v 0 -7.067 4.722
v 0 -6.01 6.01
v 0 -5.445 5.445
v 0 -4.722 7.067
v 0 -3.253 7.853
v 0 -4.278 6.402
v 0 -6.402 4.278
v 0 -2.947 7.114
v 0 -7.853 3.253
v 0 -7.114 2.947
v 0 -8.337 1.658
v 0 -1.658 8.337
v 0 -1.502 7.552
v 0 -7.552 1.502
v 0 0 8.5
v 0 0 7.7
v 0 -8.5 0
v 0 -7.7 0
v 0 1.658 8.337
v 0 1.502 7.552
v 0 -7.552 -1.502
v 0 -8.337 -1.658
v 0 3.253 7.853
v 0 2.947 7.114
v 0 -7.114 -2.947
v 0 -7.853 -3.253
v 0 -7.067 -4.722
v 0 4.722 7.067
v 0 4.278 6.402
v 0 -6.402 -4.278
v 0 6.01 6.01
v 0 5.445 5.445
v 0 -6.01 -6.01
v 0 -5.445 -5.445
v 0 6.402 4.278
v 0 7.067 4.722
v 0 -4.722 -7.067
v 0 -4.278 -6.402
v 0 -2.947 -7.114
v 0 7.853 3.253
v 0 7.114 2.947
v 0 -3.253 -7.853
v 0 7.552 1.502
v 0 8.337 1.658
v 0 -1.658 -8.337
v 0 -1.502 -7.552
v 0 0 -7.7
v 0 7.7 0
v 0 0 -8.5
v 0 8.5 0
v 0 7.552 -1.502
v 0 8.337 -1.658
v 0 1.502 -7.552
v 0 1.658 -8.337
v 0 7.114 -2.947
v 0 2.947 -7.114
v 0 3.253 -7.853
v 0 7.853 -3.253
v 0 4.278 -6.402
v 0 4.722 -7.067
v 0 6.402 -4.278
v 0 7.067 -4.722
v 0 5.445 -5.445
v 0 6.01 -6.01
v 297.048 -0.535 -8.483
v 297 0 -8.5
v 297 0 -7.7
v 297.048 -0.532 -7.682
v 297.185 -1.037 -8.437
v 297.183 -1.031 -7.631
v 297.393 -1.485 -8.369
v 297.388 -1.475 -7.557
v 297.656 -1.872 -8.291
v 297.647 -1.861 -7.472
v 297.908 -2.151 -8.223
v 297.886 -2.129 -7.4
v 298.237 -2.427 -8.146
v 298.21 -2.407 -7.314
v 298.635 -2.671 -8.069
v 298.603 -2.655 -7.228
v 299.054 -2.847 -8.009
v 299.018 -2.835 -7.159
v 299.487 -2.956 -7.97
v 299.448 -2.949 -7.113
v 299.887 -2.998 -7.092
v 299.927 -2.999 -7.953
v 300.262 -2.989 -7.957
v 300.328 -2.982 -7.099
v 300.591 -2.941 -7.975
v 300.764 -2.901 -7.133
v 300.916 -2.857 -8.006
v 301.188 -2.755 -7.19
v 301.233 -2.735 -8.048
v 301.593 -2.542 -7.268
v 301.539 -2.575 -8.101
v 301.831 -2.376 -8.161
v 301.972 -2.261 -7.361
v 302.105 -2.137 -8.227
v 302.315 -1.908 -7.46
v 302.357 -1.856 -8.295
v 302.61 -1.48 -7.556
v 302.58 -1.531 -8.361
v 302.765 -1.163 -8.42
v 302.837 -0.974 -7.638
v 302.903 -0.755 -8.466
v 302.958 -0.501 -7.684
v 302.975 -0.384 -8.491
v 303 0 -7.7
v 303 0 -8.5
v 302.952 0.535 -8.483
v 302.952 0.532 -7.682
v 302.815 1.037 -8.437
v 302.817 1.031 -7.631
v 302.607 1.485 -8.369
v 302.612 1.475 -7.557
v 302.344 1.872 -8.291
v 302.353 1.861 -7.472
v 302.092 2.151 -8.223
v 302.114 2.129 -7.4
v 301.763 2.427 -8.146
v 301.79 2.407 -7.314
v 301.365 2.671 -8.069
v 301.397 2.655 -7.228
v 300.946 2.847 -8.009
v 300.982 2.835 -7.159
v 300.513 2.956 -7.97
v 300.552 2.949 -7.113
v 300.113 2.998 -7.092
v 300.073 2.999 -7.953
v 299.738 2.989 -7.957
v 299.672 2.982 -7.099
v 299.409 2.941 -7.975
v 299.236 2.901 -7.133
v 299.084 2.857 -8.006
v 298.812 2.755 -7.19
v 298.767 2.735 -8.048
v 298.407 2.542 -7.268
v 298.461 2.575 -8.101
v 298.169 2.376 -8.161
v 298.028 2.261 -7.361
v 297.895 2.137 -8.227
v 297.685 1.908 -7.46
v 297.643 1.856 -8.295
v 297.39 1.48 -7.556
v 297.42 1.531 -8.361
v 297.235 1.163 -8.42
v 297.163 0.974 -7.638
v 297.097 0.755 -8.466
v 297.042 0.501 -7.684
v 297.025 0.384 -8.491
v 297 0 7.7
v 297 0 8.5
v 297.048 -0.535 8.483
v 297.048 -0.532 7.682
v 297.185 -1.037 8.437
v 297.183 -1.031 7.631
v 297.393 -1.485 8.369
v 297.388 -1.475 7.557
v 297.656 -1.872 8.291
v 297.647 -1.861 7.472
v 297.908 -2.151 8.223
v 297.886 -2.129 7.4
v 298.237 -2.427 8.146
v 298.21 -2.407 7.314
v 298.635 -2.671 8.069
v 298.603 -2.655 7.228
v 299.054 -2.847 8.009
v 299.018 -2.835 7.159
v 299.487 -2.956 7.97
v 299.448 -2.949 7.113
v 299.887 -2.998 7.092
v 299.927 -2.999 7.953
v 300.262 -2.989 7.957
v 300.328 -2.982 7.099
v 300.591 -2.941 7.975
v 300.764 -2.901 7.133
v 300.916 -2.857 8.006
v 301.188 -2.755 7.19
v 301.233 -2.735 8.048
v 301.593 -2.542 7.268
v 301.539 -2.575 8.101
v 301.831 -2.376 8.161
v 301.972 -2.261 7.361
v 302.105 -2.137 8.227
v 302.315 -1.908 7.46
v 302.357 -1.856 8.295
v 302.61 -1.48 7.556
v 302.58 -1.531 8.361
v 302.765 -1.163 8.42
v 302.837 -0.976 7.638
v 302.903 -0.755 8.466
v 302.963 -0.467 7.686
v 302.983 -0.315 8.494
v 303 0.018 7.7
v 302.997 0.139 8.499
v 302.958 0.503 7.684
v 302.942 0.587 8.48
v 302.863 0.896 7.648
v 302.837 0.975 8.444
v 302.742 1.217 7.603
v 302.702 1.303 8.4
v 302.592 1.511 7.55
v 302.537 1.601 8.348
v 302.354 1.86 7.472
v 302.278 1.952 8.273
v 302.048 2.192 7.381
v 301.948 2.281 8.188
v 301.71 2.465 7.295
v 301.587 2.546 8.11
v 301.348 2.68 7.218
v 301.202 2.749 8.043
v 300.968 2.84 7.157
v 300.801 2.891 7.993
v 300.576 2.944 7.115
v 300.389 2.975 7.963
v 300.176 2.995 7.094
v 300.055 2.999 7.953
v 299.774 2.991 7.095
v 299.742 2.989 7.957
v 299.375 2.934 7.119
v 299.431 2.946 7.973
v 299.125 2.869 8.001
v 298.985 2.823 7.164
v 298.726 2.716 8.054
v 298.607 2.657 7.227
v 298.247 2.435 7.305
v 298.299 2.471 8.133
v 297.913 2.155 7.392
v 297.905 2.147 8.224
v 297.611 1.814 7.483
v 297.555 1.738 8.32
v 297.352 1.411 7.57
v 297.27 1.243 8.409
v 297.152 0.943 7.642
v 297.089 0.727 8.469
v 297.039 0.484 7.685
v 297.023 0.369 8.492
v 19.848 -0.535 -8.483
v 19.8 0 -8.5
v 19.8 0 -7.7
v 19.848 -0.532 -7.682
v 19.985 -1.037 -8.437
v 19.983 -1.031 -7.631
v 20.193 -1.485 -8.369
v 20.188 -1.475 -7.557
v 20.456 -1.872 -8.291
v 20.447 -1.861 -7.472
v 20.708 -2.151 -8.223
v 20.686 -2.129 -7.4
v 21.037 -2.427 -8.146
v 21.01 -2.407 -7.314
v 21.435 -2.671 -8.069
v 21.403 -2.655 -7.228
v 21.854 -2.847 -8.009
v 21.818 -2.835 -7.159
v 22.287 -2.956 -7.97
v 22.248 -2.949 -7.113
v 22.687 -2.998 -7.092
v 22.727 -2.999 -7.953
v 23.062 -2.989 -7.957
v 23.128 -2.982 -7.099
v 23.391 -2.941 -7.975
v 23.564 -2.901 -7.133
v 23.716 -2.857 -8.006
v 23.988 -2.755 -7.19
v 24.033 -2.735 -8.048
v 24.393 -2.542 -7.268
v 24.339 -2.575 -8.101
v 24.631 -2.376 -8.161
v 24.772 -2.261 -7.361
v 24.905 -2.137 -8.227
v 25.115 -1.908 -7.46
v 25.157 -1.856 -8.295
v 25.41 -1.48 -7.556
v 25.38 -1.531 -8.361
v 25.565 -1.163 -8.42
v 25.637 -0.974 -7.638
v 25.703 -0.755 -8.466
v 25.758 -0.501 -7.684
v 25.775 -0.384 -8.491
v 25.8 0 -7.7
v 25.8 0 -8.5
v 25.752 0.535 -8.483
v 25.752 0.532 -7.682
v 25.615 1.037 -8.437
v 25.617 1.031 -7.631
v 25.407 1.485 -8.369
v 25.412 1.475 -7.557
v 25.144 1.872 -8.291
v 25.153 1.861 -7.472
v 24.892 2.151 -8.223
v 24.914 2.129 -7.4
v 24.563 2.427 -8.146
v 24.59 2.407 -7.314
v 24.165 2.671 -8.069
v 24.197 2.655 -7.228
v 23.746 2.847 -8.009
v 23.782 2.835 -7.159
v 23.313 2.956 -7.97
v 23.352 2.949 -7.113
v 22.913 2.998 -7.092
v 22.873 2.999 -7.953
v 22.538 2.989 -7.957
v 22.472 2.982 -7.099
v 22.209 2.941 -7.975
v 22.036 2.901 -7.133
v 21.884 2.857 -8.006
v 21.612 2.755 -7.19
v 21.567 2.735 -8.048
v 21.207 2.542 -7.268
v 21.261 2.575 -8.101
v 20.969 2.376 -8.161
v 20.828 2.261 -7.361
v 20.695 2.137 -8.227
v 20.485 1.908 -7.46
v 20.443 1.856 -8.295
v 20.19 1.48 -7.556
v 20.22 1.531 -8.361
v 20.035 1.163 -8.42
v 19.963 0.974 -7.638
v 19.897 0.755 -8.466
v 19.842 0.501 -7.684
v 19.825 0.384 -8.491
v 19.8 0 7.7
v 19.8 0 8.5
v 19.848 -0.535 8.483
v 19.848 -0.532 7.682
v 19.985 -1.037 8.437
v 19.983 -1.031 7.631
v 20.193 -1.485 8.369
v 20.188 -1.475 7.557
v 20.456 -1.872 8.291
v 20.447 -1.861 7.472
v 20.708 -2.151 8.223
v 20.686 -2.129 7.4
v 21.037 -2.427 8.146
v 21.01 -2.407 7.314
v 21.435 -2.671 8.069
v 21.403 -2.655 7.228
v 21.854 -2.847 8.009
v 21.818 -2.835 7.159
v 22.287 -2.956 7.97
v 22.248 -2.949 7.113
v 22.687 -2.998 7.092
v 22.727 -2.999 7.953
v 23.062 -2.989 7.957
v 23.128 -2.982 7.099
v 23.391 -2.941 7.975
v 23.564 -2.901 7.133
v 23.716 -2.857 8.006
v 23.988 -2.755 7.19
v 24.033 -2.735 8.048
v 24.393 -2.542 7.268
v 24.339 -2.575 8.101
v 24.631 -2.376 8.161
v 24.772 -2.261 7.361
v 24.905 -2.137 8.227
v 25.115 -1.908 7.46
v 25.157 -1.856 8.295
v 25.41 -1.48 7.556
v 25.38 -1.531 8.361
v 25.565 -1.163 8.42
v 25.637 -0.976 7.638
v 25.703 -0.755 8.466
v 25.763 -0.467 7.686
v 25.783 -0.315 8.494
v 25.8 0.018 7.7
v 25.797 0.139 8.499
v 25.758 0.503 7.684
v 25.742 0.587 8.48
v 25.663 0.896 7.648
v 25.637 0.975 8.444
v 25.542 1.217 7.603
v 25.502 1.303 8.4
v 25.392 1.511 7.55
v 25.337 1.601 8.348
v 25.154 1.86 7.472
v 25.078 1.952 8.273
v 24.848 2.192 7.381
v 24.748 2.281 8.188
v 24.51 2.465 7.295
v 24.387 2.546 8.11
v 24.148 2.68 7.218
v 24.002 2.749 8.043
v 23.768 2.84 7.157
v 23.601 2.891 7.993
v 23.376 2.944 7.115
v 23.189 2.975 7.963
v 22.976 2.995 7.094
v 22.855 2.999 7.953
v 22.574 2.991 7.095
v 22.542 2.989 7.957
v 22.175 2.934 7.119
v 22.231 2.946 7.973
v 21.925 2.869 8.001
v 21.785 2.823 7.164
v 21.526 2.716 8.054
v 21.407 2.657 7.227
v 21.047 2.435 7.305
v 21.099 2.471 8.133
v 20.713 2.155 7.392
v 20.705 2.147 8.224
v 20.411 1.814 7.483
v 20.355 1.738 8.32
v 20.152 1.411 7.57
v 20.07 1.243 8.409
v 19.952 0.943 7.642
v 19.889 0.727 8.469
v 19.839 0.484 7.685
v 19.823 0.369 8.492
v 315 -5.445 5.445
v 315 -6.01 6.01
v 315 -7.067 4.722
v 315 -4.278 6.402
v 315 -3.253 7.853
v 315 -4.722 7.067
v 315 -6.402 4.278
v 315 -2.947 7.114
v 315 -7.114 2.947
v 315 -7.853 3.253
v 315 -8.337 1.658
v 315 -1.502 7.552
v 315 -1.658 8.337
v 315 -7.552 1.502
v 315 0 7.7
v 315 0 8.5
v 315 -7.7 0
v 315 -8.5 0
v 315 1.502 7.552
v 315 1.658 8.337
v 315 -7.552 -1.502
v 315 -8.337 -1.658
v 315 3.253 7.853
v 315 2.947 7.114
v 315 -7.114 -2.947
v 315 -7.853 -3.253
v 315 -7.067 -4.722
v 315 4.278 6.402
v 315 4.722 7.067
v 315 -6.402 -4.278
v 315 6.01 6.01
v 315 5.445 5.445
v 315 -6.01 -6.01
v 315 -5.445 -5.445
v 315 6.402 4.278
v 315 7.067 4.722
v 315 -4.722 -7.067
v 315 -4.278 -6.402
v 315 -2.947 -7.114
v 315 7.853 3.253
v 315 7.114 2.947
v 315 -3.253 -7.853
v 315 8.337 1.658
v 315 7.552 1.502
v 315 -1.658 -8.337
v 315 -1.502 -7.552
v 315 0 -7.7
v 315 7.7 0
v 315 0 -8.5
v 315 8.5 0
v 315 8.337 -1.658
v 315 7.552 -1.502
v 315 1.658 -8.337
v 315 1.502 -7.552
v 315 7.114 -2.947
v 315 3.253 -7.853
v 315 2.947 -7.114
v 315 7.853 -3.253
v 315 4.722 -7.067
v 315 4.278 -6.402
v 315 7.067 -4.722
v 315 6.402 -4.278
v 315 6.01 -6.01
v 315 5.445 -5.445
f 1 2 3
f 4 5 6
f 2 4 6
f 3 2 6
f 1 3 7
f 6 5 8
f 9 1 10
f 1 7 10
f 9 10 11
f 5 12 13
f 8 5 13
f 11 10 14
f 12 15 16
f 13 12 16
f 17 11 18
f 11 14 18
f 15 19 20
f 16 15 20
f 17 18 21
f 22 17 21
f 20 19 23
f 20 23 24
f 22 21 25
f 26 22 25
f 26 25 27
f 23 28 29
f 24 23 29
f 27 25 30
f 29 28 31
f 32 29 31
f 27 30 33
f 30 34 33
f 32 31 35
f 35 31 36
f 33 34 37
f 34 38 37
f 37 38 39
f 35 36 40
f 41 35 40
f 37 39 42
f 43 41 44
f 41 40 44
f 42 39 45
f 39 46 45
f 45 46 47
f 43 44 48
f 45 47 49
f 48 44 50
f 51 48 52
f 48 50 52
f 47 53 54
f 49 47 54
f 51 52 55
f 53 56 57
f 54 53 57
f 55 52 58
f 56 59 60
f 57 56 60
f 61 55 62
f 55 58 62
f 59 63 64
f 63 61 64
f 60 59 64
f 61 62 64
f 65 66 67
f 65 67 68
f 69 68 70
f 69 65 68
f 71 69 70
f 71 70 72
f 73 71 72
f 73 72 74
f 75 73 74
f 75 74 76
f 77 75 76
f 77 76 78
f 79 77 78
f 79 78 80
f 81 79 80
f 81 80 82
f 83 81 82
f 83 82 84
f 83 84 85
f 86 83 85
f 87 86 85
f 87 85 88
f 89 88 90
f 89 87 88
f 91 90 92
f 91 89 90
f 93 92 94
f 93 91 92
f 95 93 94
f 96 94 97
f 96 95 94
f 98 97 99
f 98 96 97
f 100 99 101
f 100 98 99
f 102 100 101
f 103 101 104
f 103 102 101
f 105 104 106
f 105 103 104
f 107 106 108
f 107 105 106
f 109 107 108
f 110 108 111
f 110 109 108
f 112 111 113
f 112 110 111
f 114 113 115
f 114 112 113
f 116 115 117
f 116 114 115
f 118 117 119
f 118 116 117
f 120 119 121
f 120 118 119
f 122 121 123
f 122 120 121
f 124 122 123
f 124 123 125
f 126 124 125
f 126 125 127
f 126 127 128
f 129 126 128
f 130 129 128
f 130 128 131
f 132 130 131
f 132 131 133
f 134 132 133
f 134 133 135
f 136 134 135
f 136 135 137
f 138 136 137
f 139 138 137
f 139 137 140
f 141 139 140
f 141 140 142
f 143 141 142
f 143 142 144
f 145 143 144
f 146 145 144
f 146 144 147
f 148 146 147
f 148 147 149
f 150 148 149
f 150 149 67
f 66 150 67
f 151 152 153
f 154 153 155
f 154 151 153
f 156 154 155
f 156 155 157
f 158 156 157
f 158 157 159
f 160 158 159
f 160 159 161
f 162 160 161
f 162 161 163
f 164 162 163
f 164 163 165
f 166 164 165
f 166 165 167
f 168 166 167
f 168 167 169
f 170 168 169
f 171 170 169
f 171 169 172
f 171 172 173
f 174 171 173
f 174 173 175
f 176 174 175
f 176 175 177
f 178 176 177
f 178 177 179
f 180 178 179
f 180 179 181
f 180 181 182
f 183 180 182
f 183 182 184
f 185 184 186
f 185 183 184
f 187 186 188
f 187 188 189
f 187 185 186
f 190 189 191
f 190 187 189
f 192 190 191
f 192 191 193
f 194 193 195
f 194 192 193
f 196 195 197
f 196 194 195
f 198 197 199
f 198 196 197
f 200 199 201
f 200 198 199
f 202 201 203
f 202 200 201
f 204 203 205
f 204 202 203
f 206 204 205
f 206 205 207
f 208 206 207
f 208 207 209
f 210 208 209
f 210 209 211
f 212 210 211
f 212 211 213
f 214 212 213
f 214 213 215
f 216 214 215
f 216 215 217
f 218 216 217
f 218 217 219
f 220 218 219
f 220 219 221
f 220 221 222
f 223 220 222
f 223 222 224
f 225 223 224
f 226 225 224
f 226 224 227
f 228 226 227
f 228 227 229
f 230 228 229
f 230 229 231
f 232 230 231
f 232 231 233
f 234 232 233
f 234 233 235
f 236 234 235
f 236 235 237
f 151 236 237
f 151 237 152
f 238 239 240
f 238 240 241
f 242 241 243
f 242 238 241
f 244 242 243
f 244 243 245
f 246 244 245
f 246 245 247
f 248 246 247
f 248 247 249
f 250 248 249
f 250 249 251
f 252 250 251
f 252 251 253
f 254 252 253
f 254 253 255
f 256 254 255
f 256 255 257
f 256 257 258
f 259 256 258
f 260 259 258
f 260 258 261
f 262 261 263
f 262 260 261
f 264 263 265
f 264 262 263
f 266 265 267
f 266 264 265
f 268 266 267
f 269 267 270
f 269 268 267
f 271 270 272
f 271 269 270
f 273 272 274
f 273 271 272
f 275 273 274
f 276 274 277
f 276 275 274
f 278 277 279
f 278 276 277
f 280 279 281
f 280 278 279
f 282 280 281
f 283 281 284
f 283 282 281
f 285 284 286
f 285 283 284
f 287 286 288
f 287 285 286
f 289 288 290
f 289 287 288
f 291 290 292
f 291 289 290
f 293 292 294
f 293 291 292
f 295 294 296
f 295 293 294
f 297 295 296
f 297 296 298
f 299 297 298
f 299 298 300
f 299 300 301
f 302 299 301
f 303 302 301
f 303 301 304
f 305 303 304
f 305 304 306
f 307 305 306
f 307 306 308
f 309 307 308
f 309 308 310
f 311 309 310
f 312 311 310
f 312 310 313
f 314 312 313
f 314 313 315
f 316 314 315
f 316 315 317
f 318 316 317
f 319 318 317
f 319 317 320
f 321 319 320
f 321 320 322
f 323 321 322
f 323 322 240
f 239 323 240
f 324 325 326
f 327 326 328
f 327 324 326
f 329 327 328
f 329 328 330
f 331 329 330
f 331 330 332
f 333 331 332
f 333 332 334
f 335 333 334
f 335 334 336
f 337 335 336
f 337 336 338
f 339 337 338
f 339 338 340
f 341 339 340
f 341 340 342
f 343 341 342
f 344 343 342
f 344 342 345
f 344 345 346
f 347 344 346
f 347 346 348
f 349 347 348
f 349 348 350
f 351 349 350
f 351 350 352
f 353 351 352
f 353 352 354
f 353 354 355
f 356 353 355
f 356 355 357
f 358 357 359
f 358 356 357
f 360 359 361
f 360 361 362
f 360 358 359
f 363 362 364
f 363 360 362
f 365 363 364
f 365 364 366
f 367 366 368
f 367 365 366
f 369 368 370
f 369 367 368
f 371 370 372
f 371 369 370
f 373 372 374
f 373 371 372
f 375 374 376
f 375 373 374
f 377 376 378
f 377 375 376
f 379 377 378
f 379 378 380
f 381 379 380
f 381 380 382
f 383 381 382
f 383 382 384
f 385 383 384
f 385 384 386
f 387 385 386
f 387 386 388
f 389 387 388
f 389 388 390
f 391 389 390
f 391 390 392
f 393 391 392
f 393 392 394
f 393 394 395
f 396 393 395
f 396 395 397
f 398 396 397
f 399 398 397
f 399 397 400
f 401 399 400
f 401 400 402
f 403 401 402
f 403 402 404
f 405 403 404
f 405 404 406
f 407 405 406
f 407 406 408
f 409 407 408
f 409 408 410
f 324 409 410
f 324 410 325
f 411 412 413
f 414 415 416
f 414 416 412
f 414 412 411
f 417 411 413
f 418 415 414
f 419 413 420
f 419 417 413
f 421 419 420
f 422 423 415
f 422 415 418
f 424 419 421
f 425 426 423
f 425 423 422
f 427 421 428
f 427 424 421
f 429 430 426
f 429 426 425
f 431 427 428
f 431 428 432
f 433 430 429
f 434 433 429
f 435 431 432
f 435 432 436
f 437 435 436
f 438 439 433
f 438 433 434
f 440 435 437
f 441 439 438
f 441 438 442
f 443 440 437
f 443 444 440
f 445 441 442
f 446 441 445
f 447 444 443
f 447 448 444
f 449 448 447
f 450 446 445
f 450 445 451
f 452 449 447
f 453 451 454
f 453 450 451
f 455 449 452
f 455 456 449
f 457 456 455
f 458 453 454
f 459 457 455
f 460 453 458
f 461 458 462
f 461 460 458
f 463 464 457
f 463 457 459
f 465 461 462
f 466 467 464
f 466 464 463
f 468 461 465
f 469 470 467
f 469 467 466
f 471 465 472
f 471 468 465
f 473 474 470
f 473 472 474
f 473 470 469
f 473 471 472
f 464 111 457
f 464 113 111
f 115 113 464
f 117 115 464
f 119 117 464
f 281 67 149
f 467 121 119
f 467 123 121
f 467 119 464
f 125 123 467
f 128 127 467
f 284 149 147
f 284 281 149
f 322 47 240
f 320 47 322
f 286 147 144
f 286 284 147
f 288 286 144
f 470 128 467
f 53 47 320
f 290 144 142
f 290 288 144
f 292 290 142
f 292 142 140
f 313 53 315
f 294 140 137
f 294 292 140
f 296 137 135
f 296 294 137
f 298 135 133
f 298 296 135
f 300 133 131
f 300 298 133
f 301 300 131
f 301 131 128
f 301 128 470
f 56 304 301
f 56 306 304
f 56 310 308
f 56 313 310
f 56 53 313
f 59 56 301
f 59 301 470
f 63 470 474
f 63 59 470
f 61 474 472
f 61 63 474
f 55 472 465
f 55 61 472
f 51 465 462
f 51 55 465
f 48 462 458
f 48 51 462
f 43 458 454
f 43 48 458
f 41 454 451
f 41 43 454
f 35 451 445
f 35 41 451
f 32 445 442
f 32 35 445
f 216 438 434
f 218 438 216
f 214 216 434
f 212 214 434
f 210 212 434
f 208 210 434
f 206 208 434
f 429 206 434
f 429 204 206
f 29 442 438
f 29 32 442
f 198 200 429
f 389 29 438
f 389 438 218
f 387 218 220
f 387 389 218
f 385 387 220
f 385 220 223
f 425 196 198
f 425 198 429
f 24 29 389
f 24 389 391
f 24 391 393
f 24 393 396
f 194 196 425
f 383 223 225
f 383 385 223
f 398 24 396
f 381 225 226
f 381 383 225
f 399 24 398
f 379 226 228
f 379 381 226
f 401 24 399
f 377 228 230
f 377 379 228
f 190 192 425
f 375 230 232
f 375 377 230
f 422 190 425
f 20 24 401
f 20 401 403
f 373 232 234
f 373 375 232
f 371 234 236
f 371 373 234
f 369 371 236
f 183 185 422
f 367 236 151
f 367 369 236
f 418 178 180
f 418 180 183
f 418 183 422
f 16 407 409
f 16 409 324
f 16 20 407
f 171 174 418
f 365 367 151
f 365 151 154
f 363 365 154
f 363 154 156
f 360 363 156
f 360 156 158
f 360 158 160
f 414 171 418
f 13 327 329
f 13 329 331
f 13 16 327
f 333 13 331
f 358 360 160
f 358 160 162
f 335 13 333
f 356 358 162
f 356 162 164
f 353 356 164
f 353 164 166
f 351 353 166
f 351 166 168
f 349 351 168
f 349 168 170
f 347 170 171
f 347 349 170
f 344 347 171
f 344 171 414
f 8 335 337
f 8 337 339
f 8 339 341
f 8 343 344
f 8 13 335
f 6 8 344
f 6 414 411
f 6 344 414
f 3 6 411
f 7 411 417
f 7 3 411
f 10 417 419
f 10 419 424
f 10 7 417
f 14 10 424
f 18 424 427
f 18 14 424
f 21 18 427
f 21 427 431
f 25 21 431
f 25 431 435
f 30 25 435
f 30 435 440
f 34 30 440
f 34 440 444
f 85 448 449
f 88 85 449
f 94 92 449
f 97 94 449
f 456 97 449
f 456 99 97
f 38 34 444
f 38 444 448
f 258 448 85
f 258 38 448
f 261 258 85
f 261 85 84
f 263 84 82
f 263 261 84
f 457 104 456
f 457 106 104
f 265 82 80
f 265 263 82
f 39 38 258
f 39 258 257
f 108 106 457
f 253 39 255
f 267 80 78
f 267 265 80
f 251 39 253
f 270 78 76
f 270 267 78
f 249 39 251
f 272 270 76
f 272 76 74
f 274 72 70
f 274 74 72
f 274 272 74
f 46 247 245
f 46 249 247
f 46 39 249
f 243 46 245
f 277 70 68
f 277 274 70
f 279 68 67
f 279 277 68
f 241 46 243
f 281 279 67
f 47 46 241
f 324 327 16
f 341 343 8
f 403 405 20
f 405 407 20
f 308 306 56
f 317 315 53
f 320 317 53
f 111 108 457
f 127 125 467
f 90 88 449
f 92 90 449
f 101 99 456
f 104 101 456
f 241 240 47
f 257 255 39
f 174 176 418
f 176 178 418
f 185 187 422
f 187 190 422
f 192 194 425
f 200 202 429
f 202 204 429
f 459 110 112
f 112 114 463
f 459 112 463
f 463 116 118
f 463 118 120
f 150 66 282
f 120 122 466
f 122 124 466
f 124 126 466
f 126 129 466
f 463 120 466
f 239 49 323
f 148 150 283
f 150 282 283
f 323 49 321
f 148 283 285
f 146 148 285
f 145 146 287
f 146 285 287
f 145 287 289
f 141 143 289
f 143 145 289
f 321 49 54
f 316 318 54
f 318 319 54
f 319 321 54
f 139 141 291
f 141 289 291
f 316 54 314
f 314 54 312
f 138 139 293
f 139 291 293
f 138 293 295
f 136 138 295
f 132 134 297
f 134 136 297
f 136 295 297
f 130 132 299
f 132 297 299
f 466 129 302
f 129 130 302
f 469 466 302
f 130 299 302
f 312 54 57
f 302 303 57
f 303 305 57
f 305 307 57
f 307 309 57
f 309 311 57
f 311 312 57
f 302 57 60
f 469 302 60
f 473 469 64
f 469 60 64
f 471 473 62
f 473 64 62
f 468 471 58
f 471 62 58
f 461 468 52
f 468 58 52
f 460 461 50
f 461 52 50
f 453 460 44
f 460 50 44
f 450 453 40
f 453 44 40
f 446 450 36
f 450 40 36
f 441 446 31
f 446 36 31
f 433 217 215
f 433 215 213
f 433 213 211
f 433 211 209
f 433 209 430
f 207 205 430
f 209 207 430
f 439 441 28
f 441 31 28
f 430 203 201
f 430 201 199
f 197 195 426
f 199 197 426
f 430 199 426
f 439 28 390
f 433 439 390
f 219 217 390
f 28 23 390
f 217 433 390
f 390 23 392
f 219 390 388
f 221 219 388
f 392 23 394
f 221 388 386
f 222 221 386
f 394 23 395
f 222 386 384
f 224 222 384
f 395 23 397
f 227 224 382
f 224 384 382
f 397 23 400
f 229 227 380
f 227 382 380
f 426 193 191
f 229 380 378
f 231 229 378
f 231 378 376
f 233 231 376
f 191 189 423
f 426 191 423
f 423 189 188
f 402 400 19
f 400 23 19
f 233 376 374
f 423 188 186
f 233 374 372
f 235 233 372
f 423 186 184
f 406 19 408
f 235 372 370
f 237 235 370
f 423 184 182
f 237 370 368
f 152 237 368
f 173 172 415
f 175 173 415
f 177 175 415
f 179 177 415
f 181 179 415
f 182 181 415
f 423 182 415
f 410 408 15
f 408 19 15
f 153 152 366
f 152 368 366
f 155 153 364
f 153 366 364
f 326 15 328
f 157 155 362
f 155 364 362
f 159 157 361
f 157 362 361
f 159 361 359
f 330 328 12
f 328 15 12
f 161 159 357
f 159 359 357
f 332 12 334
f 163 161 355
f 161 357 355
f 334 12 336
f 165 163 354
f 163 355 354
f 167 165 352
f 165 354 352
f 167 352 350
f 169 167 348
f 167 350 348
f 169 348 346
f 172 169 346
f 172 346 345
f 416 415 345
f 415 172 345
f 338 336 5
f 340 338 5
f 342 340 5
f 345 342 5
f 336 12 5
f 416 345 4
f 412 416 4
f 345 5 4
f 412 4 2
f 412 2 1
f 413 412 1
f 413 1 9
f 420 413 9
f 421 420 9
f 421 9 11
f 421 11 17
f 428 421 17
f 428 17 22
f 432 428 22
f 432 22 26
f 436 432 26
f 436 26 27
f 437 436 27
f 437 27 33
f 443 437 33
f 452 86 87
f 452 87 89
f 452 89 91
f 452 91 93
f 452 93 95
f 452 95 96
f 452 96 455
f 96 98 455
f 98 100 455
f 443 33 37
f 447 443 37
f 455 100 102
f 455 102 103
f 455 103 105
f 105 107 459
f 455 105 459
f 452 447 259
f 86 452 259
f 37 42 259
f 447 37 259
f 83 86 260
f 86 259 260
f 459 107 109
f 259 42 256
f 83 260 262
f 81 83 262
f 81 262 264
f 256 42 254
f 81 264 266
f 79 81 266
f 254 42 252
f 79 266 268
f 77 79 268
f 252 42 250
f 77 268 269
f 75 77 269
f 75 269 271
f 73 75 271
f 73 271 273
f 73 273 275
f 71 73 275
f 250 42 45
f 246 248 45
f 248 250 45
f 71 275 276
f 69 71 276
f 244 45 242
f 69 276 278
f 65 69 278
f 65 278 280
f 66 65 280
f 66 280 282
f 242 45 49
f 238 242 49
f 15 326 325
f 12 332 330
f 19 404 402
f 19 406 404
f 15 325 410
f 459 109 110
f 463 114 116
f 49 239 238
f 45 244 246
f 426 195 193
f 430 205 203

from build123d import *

# Parameters (mm, degrees)
SKETCH1_R               = 8.5
SKETCH1_R_2             = 7.7
BOSS_EXTRUDE1_DEPTH     = 315
CUT_EXTRUDE1_DEPTH      = 320
CUT_EXTRUDE1_DEPTH_BACK = 320
SKETCH2_R               = 3


with BuildPart() as part:
    # Sketch1 → Boss-Extrude1 (new body)
    with BuildSketch(Plane(origin=(0, 0, 0), x_dir=(0, 0, -1), z_dir=(1, 0, 0))):
        Circle(SKETCH1_R)
        Circle(SKETCH1_R_2, mode=Mode.SUBTRACT)
    extrude(amount=BOSS_EXTRUDE1_DEPTH)

    # Sketch2 → Cut-Extrude1 (cut, two sides: drawn at the far end of the back side and taken through both)
    with BuildSketch(Plane.XY.offset(-CUT_EXTRUDE1_DEPTH_BACK)):
        with Locations((22.8, 0)):
            Circle(SKETCH2_R)
        with Locations((300, 0)):
            Circle(SKETCH2_R)
    extrude(amount=CUT_EXTRUDE1_DEPTH + CUT_EXTRUDE1_DEPTH_BACK, mode=Mode.SUBTRACT)


solid = part.part
